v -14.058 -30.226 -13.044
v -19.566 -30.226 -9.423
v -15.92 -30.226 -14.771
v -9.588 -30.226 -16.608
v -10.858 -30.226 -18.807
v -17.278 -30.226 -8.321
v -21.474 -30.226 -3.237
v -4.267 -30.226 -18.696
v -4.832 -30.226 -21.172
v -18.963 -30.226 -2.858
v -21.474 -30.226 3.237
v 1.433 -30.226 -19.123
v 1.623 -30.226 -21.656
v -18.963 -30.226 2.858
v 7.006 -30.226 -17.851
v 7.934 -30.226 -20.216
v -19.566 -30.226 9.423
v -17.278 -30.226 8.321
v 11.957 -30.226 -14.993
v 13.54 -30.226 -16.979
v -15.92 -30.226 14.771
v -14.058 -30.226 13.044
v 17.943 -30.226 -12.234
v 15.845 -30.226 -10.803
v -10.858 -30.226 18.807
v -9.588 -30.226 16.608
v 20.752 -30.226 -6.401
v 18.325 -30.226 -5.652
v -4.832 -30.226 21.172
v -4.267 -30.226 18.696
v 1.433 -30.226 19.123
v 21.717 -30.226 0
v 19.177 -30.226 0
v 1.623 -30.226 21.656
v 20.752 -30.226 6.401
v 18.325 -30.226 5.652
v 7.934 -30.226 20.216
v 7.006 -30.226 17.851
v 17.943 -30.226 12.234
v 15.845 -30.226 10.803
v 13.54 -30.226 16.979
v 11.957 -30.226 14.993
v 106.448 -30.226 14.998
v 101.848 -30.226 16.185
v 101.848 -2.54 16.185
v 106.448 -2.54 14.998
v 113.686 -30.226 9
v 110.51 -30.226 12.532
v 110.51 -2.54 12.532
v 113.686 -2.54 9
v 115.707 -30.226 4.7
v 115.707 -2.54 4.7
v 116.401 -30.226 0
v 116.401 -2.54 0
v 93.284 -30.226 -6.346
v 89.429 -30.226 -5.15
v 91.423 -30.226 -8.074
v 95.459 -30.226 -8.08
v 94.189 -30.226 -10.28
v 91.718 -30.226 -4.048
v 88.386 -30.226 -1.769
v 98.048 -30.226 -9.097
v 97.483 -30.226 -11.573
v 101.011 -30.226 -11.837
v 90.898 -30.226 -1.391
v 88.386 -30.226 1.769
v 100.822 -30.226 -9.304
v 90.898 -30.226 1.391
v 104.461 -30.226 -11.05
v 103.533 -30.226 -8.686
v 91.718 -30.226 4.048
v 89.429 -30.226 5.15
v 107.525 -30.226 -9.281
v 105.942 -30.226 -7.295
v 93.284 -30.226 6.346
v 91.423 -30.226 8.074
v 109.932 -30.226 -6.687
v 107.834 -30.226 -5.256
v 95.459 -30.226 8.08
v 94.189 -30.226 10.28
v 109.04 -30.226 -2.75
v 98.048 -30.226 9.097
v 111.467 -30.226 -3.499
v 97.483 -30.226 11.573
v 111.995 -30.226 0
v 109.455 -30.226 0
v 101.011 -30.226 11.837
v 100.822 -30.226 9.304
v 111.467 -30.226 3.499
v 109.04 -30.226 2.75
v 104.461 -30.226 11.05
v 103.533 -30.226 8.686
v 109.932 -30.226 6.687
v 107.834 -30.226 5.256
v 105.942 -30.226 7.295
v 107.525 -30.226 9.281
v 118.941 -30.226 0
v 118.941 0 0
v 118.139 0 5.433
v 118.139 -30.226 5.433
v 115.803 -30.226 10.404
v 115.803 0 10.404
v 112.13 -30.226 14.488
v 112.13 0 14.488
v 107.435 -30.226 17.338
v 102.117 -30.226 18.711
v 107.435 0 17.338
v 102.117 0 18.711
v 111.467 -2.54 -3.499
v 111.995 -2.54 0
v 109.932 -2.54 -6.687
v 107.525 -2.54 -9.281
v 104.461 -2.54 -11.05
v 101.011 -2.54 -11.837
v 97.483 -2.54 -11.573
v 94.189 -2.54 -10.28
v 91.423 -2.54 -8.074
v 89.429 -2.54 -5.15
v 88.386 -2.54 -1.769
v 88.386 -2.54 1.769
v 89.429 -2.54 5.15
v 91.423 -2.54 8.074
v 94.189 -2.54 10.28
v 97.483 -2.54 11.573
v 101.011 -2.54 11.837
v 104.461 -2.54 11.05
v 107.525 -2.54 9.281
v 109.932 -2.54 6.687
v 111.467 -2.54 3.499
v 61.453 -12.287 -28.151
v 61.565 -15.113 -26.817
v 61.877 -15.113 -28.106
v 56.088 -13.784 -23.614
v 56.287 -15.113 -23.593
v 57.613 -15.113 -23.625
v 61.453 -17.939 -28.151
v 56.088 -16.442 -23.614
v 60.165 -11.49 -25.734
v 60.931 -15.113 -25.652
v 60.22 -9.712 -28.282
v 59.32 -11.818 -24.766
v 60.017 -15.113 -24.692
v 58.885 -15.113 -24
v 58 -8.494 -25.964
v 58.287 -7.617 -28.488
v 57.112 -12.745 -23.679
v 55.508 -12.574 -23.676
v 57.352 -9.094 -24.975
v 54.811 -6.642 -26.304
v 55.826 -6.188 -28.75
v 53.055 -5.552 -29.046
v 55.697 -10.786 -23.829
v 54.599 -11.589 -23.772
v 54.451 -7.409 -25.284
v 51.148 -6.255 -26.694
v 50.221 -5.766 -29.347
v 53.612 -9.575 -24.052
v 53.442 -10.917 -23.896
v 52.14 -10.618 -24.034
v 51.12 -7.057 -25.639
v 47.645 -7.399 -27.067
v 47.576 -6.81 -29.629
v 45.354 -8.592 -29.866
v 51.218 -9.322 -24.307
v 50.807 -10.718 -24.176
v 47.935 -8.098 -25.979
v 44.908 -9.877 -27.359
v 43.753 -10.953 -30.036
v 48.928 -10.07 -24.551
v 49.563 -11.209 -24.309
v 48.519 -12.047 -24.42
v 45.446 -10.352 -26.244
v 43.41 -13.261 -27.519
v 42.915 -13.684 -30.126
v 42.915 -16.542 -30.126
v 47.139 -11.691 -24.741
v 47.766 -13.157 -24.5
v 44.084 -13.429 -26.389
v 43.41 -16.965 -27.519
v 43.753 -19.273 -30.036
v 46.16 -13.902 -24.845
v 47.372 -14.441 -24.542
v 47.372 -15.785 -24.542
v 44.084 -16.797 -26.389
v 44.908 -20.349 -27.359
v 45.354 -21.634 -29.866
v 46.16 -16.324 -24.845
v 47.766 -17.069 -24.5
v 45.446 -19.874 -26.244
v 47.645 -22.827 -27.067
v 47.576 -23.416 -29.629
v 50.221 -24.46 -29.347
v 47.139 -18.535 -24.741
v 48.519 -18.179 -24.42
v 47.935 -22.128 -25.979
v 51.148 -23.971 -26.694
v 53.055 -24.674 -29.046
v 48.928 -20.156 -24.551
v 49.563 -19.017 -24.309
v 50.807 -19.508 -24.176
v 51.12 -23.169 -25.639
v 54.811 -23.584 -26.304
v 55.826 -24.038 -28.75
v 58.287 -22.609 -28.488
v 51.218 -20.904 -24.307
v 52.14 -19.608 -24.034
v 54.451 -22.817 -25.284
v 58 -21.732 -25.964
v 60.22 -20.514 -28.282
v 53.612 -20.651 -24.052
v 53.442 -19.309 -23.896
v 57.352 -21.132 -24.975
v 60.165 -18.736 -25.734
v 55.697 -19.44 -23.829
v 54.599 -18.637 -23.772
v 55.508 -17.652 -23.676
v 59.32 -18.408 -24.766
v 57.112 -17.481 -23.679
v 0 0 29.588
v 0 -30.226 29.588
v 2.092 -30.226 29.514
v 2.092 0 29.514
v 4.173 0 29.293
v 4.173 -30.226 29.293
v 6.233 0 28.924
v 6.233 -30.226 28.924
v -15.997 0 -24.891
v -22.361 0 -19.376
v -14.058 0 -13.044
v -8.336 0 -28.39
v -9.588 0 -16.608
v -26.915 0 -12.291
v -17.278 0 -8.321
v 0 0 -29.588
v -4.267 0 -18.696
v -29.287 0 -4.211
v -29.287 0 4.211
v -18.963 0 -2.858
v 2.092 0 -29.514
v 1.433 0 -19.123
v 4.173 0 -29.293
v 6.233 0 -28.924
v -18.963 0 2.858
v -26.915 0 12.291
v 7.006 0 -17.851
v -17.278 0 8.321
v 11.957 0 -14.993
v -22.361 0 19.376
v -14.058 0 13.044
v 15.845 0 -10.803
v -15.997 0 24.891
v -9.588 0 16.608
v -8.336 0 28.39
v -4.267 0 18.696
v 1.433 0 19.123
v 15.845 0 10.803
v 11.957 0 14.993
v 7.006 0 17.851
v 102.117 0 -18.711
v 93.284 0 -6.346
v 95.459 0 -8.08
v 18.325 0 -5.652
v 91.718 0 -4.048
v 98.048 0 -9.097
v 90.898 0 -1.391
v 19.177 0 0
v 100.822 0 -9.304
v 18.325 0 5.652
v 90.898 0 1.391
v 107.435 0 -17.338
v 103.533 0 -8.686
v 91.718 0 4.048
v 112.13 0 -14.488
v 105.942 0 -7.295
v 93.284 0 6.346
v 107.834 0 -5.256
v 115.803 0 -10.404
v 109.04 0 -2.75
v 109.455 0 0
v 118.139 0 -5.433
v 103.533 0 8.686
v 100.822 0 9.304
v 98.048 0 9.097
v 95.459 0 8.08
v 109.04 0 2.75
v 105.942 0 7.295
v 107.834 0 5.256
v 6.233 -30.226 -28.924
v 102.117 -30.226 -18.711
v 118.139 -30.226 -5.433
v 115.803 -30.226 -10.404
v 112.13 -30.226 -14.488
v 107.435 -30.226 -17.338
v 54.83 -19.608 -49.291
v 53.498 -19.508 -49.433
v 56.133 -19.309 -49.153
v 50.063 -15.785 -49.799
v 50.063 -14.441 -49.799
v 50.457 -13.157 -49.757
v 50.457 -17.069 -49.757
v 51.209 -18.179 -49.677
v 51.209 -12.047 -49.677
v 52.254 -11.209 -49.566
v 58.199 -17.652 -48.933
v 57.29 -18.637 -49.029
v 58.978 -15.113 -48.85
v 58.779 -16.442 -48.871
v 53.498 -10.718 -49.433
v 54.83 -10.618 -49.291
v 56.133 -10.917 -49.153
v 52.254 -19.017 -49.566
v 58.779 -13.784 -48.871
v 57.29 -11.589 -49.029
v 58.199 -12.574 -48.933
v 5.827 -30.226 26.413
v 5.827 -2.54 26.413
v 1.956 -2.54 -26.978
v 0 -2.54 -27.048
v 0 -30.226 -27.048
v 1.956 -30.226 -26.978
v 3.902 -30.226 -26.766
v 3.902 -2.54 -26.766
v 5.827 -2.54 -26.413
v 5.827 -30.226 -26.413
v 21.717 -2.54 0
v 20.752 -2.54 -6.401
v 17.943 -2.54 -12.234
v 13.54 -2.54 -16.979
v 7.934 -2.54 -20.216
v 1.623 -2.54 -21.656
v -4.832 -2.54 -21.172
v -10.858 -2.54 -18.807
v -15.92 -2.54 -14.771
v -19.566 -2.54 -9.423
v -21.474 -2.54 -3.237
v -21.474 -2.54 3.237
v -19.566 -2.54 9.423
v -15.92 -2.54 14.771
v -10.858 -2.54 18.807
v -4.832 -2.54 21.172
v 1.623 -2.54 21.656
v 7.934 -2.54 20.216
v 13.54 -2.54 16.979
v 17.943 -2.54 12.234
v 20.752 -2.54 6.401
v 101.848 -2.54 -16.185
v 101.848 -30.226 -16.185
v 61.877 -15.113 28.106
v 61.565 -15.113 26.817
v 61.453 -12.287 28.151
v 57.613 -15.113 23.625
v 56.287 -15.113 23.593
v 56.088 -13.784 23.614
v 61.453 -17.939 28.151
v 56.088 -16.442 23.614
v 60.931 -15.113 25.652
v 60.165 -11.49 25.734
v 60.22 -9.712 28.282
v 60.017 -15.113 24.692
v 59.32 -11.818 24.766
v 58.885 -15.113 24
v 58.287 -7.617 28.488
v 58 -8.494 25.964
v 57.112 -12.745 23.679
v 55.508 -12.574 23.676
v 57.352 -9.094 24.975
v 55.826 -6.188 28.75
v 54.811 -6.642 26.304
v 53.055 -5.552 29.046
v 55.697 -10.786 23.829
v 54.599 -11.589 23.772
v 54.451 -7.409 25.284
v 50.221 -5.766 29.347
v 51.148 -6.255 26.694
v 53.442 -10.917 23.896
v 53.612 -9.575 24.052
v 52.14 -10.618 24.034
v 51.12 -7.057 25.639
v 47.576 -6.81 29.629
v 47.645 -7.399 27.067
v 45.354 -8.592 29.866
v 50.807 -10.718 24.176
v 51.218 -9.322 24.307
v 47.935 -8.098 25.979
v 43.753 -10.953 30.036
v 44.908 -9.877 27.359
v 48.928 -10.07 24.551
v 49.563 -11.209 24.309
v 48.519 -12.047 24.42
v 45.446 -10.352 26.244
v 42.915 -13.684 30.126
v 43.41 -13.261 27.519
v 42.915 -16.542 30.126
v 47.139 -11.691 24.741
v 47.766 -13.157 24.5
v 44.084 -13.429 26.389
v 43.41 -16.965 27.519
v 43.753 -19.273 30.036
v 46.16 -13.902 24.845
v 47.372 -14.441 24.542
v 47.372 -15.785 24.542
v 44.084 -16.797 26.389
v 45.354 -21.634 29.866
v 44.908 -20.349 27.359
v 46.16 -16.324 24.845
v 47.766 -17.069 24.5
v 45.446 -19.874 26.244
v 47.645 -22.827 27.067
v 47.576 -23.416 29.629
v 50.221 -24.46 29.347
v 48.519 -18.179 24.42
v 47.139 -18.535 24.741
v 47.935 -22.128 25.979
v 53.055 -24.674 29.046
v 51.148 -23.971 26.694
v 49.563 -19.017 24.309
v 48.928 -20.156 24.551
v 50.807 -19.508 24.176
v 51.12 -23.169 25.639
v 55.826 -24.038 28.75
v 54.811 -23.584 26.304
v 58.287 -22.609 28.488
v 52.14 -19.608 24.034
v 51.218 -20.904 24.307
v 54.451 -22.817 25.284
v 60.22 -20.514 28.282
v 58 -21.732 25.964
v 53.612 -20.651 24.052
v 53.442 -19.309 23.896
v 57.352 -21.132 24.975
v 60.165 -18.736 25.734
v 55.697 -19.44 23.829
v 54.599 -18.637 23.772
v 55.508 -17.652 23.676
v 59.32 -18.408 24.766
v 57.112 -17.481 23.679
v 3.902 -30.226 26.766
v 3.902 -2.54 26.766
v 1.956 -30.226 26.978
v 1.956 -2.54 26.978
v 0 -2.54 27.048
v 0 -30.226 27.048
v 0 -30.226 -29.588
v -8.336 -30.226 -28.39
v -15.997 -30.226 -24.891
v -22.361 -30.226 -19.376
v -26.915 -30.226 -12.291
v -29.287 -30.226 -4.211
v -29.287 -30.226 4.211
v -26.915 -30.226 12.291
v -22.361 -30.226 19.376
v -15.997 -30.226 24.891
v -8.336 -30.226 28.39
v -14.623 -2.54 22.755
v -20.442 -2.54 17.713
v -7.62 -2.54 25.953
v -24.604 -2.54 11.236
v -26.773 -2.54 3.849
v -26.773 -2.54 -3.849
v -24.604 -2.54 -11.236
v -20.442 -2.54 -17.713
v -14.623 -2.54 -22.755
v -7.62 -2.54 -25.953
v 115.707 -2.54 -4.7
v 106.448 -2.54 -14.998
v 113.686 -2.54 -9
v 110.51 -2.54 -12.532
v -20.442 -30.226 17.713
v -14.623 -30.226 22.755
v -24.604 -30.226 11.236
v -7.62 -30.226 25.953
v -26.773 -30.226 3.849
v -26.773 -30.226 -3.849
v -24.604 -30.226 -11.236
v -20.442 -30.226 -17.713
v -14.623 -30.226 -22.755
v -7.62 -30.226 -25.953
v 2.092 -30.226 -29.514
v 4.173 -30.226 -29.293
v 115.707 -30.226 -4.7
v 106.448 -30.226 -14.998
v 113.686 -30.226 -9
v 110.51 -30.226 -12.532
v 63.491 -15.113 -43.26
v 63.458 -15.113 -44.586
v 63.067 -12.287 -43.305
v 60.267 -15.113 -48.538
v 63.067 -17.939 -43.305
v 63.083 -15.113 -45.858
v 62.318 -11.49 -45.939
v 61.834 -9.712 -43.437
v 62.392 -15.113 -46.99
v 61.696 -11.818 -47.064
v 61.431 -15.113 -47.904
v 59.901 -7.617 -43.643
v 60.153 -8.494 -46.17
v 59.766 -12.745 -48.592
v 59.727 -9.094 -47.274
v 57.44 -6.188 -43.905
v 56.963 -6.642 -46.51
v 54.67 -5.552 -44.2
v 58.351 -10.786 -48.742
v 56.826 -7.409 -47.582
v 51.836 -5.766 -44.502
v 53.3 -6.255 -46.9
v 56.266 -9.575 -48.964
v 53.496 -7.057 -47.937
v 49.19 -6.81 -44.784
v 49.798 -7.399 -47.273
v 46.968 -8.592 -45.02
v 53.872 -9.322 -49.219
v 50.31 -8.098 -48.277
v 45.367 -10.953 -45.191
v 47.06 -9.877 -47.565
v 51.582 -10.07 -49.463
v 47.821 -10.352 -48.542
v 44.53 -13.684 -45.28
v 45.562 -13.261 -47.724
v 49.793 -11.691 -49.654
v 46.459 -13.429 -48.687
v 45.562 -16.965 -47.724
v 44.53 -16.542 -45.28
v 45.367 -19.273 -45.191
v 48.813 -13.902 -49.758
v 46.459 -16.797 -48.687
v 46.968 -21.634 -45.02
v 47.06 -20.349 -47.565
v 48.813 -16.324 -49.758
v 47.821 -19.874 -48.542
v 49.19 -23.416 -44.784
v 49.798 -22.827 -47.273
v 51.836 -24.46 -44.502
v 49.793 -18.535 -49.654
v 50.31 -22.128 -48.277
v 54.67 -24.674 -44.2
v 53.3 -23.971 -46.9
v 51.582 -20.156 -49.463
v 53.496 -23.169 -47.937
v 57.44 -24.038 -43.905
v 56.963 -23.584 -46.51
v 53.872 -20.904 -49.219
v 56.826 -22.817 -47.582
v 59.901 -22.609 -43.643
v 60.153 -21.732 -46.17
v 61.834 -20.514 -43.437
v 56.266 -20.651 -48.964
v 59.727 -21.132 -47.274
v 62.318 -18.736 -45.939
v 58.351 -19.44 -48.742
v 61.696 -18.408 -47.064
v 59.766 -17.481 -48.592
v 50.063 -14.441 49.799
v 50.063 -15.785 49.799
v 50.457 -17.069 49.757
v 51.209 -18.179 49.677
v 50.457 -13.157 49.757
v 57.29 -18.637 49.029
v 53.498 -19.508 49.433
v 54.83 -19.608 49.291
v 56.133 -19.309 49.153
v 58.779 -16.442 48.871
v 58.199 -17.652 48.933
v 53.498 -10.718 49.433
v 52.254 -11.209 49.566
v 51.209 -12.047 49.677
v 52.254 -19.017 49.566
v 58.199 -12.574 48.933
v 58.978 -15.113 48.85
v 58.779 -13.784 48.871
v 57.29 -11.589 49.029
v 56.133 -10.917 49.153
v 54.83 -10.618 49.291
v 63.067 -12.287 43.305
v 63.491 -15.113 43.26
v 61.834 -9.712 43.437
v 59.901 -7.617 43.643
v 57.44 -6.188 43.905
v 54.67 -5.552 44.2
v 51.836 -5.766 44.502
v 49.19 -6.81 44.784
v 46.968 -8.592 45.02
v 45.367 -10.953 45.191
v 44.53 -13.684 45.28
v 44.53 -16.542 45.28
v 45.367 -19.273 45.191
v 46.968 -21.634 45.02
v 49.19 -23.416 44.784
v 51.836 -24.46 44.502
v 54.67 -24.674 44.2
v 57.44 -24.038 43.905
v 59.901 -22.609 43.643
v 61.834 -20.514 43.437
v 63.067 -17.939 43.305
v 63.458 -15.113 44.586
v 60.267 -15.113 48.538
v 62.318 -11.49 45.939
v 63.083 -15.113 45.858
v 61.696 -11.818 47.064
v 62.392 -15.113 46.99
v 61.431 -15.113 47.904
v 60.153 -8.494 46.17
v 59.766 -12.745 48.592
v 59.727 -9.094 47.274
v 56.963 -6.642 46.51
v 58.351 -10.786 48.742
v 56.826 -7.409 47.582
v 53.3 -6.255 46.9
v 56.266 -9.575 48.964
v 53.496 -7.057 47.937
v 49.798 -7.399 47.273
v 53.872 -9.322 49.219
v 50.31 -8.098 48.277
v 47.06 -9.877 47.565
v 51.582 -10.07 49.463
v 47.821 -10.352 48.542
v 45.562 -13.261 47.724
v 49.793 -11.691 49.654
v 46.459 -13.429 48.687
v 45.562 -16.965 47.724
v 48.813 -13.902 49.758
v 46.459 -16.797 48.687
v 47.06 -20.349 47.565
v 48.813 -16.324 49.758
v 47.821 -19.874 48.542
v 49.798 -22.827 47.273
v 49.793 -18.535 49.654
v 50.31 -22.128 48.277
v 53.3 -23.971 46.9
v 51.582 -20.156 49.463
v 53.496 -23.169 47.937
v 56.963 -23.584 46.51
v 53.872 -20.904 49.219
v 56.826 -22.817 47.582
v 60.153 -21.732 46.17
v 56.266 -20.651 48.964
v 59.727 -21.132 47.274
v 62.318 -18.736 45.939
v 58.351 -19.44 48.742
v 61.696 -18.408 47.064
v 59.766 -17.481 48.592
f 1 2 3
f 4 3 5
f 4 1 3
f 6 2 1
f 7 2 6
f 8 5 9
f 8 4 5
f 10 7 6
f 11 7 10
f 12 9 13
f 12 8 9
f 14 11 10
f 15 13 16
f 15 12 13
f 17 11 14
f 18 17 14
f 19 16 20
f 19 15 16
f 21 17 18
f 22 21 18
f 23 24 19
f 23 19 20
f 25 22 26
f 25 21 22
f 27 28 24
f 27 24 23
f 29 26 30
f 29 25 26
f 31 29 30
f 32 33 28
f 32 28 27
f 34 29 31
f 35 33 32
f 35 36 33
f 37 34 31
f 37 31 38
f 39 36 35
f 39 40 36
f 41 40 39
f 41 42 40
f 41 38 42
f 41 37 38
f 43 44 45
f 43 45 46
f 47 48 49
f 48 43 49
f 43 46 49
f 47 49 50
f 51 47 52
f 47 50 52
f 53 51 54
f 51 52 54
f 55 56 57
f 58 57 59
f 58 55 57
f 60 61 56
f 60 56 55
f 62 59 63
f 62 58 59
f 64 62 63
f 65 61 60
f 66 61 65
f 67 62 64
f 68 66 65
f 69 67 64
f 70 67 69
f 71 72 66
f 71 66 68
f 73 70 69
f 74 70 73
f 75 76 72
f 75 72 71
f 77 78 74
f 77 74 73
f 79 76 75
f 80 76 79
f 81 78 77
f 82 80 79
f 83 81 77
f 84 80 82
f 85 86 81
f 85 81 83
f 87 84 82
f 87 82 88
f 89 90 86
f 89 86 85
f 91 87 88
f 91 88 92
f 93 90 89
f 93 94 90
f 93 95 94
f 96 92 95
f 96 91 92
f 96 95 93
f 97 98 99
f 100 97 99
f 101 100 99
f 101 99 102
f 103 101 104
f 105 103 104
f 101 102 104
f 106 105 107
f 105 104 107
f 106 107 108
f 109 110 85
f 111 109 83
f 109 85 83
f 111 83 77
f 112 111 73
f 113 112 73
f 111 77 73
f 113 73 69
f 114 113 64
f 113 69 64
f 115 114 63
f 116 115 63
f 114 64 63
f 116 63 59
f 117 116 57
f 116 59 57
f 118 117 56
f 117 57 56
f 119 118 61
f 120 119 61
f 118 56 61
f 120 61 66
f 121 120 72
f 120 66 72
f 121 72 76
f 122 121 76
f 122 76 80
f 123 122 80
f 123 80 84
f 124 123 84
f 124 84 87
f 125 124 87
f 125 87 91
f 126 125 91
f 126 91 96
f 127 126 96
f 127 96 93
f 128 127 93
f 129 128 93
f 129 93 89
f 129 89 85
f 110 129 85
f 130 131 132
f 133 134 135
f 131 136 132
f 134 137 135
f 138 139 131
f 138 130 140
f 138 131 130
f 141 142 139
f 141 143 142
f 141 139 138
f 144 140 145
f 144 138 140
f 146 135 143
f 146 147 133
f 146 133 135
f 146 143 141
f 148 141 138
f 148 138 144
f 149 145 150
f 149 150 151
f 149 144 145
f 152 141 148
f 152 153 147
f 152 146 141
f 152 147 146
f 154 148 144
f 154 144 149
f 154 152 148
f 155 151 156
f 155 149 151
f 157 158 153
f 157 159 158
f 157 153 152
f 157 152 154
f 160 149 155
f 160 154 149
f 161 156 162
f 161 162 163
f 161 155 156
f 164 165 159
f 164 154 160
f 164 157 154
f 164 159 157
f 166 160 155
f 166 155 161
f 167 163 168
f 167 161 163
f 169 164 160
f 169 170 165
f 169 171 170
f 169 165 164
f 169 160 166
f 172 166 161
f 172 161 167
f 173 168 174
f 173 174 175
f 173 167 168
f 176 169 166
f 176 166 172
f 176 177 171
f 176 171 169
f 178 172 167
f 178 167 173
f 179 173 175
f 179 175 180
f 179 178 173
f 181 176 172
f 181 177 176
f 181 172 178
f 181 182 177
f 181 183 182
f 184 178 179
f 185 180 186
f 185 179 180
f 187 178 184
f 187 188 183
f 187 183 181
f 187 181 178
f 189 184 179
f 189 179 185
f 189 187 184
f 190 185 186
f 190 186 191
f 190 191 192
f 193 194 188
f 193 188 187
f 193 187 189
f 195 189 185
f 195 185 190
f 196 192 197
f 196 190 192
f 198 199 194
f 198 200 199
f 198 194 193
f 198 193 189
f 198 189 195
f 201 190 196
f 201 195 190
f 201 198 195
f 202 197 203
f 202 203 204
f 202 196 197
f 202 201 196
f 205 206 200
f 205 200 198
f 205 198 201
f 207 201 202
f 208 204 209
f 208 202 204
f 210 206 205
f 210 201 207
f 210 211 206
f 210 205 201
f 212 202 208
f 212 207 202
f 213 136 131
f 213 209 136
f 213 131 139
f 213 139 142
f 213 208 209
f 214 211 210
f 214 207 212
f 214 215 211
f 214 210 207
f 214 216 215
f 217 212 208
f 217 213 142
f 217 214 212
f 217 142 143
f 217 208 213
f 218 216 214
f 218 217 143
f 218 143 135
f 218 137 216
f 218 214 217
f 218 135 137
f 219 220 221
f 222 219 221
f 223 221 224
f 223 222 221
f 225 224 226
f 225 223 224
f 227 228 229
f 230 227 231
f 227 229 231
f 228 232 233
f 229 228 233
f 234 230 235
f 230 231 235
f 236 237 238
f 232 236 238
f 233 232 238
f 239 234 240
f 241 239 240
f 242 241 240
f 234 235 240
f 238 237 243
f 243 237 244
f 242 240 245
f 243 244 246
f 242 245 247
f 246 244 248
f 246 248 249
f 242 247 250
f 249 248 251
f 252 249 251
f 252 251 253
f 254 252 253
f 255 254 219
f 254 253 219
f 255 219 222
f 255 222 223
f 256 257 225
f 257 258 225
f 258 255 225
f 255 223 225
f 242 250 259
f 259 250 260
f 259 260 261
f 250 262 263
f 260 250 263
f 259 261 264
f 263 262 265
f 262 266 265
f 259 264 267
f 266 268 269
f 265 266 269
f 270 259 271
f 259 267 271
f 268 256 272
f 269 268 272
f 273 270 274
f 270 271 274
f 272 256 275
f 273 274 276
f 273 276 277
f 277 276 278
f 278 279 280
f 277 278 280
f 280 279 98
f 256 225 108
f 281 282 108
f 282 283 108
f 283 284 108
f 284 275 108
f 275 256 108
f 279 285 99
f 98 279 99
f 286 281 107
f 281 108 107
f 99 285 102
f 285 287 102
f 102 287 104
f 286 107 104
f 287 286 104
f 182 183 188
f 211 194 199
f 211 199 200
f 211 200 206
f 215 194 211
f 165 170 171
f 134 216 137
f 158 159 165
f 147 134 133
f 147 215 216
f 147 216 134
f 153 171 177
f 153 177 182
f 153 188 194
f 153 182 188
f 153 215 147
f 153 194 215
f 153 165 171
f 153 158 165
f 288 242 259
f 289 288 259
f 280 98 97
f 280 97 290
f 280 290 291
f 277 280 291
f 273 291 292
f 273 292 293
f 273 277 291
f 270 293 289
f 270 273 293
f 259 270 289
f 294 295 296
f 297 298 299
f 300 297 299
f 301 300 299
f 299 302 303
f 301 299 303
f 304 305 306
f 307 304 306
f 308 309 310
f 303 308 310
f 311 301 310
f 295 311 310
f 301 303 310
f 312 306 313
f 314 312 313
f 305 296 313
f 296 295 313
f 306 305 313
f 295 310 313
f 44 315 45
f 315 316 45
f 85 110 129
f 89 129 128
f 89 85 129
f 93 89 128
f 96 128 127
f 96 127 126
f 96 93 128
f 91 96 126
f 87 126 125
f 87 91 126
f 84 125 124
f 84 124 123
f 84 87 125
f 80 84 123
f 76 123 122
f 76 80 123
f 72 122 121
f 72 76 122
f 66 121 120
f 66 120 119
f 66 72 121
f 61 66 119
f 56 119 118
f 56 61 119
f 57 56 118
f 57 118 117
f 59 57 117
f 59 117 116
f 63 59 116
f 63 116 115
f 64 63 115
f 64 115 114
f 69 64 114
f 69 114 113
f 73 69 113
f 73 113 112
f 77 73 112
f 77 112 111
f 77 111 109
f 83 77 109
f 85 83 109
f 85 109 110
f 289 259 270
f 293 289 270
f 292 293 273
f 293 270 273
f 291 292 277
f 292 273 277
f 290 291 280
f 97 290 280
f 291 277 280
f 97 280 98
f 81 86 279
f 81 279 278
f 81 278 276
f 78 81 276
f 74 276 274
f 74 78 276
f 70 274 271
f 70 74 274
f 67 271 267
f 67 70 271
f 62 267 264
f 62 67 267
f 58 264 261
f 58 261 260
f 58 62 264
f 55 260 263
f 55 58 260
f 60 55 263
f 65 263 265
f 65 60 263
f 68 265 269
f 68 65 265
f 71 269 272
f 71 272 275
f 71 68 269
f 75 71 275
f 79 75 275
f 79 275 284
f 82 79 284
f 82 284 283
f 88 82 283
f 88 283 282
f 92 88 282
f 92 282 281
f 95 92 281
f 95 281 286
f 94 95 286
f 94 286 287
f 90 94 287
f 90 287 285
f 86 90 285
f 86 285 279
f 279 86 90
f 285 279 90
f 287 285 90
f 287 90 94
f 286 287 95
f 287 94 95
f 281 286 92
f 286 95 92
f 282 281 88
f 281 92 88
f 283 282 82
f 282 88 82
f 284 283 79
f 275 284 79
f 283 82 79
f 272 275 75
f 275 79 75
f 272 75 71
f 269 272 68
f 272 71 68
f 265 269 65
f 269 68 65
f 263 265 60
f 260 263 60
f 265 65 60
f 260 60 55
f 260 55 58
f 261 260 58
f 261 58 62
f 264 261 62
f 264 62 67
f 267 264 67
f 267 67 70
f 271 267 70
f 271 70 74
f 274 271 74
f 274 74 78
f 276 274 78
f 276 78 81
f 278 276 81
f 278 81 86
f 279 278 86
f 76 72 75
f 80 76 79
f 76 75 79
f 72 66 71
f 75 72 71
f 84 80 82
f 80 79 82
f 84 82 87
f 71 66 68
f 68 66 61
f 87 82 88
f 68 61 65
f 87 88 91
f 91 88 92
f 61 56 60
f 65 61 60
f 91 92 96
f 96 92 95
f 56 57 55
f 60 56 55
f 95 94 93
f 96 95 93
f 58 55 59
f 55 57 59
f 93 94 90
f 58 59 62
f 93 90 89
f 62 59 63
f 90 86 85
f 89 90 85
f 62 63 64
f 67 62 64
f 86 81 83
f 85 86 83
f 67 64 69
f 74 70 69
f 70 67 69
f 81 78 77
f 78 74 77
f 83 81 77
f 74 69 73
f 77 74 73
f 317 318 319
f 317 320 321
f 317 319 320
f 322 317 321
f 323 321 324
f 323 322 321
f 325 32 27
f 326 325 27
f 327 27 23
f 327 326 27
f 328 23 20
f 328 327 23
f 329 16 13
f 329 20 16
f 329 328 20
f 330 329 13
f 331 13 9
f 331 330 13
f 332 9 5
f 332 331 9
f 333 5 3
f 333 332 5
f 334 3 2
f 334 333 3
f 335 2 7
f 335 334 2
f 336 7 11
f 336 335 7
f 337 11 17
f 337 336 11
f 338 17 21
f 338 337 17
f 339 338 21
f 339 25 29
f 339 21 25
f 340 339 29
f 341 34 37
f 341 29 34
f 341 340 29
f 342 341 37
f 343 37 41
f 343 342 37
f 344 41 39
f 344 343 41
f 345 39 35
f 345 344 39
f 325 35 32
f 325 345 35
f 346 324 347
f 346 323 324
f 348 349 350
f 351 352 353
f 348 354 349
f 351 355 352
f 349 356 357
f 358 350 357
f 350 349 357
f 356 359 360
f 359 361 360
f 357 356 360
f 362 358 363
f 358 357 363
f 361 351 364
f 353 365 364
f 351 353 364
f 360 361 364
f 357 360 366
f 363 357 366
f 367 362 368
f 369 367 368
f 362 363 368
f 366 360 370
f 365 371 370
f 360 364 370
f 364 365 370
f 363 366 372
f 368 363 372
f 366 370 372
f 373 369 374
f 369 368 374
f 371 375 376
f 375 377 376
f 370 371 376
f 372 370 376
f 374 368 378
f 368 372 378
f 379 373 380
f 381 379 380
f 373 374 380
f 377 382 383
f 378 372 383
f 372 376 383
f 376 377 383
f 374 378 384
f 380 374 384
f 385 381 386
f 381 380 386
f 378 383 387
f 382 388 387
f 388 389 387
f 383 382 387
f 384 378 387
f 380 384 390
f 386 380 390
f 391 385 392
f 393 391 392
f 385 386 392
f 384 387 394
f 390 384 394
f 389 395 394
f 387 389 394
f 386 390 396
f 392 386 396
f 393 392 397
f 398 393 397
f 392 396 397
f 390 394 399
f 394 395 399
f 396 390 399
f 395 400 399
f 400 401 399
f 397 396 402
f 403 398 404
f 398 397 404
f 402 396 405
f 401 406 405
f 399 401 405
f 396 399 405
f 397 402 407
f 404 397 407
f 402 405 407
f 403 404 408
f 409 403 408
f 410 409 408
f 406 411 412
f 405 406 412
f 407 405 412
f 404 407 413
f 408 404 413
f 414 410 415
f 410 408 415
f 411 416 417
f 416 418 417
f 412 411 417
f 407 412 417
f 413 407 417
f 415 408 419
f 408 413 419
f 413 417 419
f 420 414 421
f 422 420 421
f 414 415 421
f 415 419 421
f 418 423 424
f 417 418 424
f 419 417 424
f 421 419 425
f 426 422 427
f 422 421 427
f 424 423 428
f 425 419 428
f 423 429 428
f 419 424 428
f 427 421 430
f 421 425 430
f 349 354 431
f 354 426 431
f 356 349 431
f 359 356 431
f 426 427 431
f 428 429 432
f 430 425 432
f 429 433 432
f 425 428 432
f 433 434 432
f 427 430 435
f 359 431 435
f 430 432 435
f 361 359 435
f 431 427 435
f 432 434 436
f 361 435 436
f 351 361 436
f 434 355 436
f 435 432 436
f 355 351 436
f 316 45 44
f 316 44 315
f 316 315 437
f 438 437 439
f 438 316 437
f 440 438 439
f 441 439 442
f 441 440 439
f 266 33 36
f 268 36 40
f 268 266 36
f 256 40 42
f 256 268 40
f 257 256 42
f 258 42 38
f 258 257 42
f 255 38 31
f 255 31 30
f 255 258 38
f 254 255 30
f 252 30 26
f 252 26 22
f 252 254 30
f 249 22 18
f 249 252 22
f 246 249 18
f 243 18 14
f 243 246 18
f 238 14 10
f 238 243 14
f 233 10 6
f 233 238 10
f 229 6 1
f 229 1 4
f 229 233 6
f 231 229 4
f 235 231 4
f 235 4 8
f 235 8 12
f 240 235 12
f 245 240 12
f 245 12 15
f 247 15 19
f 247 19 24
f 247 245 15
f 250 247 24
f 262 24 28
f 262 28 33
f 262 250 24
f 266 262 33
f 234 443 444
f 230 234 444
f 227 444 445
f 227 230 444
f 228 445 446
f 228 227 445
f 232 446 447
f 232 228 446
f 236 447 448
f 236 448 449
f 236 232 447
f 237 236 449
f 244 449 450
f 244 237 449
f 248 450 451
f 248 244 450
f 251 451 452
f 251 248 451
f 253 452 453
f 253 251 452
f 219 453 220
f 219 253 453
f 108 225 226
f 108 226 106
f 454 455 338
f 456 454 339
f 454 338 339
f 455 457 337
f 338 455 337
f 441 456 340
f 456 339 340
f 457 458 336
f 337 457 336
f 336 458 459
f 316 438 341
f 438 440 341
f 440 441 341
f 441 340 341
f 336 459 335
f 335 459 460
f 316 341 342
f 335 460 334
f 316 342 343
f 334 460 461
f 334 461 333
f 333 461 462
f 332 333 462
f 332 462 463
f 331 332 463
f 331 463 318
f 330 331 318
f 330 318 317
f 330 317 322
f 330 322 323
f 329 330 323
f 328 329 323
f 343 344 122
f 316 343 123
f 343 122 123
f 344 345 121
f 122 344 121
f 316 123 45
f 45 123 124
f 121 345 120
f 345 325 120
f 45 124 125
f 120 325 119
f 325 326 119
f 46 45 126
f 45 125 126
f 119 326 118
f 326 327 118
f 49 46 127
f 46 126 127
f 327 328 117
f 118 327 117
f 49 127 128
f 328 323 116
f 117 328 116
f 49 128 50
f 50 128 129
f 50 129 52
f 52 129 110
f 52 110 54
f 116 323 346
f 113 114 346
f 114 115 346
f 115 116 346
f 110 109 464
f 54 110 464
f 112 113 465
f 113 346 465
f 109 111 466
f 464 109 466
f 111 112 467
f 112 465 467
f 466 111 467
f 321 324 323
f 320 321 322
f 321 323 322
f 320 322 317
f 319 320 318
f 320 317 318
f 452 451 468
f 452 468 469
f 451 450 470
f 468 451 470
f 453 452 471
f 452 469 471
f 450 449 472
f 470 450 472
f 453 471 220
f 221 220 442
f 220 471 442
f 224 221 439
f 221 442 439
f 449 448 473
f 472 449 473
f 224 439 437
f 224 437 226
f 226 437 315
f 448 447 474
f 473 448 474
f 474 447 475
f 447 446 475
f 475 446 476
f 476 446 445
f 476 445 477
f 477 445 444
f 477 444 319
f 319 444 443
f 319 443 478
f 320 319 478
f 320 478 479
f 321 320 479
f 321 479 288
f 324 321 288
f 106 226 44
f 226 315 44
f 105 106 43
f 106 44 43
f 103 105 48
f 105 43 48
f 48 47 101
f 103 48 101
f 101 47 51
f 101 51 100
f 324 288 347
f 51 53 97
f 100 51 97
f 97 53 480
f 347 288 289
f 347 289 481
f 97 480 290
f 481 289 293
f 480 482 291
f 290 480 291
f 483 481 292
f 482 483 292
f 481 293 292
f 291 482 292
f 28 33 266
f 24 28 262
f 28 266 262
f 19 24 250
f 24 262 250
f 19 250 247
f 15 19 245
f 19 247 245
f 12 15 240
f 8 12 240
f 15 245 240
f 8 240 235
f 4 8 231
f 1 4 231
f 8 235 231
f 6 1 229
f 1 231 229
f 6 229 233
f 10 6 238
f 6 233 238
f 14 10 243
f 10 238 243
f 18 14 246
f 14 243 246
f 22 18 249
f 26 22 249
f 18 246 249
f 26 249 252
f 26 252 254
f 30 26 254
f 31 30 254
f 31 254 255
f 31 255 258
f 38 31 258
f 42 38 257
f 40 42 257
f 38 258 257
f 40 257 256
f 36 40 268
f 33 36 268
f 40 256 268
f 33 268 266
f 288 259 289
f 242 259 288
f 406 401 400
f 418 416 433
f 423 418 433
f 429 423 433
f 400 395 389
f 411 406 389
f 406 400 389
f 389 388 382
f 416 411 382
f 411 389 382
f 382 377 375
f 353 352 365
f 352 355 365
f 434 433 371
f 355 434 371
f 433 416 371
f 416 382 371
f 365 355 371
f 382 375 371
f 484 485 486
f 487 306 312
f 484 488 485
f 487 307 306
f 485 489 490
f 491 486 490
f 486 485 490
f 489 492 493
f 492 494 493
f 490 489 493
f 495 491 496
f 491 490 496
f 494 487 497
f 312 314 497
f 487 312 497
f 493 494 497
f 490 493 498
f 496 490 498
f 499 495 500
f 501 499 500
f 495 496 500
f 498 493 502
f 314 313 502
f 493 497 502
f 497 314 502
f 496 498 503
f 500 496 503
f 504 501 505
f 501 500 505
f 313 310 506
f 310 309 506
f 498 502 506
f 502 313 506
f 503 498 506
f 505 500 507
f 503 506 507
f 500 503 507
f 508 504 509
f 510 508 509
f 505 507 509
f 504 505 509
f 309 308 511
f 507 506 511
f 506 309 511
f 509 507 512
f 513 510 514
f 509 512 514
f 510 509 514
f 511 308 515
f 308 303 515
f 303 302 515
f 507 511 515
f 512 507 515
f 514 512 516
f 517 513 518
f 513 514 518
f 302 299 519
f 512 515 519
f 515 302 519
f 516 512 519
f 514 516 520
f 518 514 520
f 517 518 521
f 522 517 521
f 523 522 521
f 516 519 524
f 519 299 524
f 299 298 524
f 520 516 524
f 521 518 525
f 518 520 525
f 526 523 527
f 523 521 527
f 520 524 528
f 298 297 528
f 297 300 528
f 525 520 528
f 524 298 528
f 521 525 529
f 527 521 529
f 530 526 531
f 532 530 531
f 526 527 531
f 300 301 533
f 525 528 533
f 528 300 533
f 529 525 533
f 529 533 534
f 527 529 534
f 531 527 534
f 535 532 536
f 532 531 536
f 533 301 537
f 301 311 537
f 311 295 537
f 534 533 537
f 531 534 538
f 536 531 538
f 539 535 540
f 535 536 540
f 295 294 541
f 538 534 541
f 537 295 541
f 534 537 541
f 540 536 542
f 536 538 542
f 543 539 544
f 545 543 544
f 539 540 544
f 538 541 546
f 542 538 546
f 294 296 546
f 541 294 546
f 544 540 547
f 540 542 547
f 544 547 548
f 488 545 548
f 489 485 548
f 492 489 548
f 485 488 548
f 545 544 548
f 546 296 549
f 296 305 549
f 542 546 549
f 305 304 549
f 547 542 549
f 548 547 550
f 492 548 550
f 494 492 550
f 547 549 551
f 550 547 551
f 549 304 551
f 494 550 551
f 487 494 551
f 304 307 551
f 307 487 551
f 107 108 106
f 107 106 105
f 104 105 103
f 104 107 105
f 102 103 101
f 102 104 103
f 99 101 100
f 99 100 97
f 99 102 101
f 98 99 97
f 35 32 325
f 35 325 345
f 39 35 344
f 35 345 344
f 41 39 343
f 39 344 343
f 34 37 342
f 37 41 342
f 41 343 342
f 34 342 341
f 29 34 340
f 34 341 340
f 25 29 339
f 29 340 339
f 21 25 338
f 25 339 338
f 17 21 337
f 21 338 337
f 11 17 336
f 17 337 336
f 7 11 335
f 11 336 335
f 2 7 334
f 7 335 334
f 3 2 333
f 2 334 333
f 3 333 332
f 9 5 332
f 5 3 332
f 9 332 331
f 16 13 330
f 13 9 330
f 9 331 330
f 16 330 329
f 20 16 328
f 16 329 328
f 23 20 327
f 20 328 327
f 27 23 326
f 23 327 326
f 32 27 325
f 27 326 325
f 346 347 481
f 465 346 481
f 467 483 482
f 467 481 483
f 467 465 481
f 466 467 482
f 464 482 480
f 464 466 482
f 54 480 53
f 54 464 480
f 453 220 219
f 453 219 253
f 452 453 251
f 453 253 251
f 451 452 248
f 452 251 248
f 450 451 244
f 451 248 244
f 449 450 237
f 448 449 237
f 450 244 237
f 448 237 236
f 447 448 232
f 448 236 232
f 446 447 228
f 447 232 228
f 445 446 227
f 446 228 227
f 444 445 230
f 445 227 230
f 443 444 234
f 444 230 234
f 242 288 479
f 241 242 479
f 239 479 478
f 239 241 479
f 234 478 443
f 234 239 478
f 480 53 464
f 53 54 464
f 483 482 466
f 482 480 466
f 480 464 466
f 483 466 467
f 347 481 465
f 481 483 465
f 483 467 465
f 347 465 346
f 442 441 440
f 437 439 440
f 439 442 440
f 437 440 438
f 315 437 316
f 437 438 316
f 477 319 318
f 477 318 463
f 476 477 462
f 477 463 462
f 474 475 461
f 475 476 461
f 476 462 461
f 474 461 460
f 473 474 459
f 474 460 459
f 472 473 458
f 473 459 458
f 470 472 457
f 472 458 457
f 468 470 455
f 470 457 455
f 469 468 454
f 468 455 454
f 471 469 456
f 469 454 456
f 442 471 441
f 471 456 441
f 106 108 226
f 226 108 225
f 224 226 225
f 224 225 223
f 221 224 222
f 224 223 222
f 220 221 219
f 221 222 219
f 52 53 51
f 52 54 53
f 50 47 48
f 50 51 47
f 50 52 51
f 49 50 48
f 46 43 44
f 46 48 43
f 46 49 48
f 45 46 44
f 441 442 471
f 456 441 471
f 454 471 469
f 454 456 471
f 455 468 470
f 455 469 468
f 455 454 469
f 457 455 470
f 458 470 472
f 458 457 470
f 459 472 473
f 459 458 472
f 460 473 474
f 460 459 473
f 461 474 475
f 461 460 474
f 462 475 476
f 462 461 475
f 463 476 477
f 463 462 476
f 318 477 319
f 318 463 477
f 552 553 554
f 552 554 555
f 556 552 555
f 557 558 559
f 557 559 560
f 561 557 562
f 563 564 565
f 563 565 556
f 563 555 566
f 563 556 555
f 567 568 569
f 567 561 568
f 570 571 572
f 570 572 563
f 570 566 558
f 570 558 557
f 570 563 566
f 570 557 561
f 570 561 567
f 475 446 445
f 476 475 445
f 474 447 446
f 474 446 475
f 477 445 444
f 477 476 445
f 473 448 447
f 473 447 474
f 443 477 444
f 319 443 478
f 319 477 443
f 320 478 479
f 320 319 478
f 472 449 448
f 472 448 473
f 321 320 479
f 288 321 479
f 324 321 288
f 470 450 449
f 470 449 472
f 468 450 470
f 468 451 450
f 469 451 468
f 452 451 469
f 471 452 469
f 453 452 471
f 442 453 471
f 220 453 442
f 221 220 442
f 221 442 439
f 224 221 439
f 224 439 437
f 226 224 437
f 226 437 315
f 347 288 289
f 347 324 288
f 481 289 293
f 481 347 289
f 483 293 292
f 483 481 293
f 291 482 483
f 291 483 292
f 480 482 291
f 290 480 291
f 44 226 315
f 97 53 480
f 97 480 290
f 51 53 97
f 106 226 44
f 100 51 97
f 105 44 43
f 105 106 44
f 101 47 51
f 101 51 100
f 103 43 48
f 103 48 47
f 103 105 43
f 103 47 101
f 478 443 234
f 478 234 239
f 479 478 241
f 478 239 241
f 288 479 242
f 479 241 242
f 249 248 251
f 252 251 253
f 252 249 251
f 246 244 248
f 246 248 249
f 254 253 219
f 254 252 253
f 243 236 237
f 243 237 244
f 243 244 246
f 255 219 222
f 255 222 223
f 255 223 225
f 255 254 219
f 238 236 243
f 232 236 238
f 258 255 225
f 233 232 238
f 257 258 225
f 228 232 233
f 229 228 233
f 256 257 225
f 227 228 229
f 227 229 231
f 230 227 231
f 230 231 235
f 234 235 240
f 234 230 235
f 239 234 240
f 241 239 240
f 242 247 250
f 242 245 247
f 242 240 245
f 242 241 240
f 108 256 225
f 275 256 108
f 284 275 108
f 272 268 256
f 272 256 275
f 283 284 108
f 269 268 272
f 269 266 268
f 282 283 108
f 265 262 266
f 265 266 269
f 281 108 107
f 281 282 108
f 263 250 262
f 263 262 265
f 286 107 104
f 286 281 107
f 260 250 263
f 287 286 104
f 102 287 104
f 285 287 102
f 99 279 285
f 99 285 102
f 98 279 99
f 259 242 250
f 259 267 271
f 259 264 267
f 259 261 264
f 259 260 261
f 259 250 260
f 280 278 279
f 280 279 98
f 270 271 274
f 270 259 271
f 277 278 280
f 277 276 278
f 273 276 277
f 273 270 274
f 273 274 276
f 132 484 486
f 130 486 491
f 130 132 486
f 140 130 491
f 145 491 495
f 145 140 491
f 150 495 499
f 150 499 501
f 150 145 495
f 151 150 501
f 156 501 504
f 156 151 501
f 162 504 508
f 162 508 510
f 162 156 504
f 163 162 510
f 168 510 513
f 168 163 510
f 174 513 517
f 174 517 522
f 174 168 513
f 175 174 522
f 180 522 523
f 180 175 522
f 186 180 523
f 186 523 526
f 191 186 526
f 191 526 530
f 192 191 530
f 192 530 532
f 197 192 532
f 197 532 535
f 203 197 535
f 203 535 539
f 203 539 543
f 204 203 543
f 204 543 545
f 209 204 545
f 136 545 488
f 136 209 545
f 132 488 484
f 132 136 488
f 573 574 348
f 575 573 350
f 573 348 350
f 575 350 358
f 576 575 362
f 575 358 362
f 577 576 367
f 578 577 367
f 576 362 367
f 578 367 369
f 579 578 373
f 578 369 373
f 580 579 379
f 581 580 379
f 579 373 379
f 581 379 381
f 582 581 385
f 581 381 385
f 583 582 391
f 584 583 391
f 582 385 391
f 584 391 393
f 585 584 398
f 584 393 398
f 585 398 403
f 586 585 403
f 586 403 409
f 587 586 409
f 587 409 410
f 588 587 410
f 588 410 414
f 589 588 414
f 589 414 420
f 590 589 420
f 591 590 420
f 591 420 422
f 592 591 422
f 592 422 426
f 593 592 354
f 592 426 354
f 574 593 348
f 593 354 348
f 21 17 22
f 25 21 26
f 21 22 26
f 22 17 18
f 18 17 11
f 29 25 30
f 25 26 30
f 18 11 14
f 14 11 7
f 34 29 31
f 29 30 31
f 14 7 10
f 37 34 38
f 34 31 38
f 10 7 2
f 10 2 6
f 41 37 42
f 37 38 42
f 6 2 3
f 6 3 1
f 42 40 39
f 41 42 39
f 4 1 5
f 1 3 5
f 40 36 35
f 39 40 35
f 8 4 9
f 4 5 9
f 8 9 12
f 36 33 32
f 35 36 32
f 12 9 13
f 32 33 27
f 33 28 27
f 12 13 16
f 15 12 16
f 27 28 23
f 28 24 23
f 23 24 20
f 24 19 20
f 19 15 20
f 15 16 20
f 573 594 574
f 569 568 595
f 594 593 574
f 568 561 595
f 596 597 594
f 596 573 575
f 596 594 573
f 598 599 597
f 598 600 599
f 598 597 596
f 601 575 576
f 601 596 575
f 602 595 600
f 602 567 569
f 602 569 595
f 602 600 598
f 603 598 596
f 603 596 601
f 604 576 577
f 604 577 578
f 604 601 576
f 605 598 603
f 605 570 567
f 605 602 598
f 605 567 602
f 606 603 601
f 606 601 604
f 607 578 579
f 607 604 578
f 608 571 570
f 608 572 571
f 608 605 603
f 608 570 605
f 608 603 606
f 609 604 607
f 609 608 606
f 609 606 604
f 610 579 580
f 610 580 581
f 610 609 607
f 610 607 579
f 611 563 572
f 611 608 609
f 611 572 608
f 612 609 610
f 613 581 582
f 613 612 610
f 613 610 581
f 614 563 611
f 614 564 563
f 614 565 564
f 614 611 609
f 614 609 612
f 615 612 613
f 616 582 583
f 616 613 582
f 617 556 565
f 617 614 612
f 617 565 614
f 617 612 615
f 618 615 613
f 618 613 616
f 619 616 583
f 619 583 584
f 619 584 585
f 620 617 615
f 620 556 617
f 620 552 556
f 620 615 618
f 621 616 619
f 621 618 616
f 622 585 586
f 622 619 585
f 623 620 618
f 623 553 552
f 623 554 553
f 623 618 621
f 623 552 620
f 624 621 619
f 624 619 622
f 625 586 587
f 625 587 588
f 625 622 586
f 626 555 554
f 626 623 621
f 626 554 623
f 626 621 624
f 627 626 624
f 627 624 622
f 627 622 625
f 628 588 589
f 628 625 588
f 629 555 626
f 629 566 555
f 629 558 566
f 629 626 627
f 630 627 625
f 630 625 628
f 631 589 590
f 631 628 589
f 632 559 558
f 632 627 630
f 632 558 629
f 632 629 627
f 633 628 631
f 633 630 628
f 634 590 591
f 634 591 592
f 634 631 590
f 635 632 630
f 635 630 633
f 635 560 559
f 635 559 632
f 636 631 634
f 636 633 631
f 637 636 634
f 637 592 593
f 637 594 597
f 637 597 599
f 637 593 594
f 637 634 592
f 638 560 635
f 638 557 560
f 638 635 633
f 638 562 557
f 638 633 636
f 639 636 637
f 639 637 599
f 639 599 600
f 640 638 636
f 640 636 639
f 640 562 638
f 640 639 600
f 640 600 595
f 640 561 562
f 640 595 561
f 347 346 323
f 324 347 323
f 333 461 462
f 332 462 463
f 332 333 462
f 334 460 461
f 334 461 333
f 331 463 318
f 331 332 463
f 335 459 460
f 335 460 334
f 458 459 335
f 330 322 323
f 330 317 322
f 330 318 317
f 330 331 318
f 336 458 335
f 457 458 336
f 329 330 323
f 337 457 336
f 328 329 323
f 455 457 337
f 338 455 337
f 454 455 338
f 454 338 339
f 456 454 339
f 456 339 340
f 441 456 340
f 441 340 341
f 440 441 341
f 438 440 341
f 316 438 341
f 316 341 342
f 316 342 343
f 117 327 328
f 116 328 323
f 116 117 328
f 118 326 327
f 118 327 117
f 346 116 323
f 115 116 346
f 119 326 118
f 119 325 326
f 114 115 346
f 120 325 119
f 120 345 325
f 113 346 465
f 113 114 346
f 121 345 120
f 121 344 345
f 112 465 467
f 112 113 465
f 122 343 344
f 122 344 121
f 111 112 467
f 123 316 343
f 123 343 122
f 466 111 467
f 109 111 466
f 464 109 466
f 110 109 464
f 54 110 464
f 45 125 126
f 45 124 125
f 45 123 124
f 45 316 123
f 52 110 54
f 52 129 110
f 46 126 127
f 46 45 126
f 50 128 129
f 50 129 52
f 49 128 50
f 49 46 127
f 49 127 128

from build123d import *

# Parameters (mm, degrees)
F0_R     = 19.1769271247
F1_DEPTH = 30.226
F2_R     = 9.587871951
F3_DEPTH = 25.4
F4_R     = 5.08
F5_R     = 9.3305387122
F6_DEPTH = 49.53
F7_T     = -2.54


with BuildPart() as f1:
    # F0 (on Front) → F1 (new body)
    with BuildSketch(Plane.XZ):
        with BuildLine():
            Line((6.2329871202, 28.924471608), (0, 29.5884299388))
            ThreePointArc((0, 29.5884299388), (-29.5884299388, 0), (0, -29.5884299388))
            Line((0, -29.5884299388), (6.2329871202, -28.924471608))
            ThreePointArc((6.2329871202, -28.924471608), (23.0206373604, -18.5883146564), (29.5884299388, 0))
            ThreePointArc((29.5884299388, 0), (23.0206373604, 18.5883146564), (6.2329871202, 28.924471608))
        make_face()
        Circle(F0_R, mode=Mode.SUBTRACT)
        with BuildLine():
            ThreePointArc((6.2329871202, 28.924471608), (3.1341254404, 29.4219721291), (0, 29.5884299388))
            Line((0, 29.5884299388), (6.2329871202, 28.924471608))
        make_face()
        with BuildLine():
            Line((6.2329871202, -28.924471608), (0, -29.5884299388))
            ThreePointArc((0, -29.5884299388), (3.1341254404, -29.4219721291), (6.2329871202, -28.924471608))
        make_face()
        with BuildLine():
            Line((102.1173644581, 18.7105517173), (6.2329871202, 28.924471608))
            ThreePointArc((6.2329871202, 28.924471608), (23.0206373604, 18.5883146564), (29.5884299388, 0))
            ThreePointArc((29.5884299388, 0), (23.0206373604, -18.5883146564), (6.2329871202, -28.924471608))
            Line((6.2329871202, -28.924471608), (102.1173644581, -18.7105517173))
            ThreePointArc((102.1173644581, -18.7105517173), (81.3078462498, 0), (102.1173644581, 18.7105517173))
        make_face()
        with BuildLine():
            ThreePointArc((118.9406633957, 0), (114.1164025638, 12.5808200519), (102.1173644581, 18.7105517173))
            ThreePointArc((102.1173644581, 18.7105517173), (81.3078462498, 0), (102.1173644581, -18.7105517173))
            ThreePointArc((102.1173644581, -18.7105517173), (114.1164025638, -12.5808200519), (118.9406633957, 0))
        make_face()
    extrude(amount=F1_DEPTH)

    # F5 (on face) → F6 (cut)
    with BuildSketch(Plane.XZ.offset(30.226)):
        with Locations((100.1242548227, 0)):
            Circle(F5_R)
    extrude(amount=-F6_DEPTH, mode=Mode.SUBTRACT)

    # F7
    f7_openings = [f1.faces().sort_by_distance(p)[0] for p in [
        (44.920957, -30.226, 0),
    ]]
    offset(amount=F7_T, openings=f7_openings, kind=Kind.INTERSECTION)


with BuildPart() as f3:
    # F2 (on face) → F3 (new body)
    with BuildSketch(Plane(origin=(3.1164935601, 0, 29.2564507734), x_dir=(0.9943742263, 0, -0.1059240199), z_dir=(0.1059240199, 0, 0.9943742263))):
        with Locations((48.9636398852, -15.113)):
            Circle(F2_R)
    extrude(amount=F3_DEPTH)

    # F4
    f4_edges = [f3.edges().sort_by_distance(p)[0] for p in [
        (62.683843, -15.113, 35.682992),
        (42.270742, -15.113, 25.085611),
        (44.961212, -15.113, 50.342716),
    ]]
    fillet(f4_edges, radius=F4_R)


with BuildPart() as f8_1:
    # F8: instance of F3
    add(f3.part.mirror(Plane.XY))


with BuildPart() as f8_2:
    # F8: instance of F1
    add(f1.part.mirror(Plane.XY))


solid = Compound([f1.part, f3.part, f8_1.part, f8_2.part])
